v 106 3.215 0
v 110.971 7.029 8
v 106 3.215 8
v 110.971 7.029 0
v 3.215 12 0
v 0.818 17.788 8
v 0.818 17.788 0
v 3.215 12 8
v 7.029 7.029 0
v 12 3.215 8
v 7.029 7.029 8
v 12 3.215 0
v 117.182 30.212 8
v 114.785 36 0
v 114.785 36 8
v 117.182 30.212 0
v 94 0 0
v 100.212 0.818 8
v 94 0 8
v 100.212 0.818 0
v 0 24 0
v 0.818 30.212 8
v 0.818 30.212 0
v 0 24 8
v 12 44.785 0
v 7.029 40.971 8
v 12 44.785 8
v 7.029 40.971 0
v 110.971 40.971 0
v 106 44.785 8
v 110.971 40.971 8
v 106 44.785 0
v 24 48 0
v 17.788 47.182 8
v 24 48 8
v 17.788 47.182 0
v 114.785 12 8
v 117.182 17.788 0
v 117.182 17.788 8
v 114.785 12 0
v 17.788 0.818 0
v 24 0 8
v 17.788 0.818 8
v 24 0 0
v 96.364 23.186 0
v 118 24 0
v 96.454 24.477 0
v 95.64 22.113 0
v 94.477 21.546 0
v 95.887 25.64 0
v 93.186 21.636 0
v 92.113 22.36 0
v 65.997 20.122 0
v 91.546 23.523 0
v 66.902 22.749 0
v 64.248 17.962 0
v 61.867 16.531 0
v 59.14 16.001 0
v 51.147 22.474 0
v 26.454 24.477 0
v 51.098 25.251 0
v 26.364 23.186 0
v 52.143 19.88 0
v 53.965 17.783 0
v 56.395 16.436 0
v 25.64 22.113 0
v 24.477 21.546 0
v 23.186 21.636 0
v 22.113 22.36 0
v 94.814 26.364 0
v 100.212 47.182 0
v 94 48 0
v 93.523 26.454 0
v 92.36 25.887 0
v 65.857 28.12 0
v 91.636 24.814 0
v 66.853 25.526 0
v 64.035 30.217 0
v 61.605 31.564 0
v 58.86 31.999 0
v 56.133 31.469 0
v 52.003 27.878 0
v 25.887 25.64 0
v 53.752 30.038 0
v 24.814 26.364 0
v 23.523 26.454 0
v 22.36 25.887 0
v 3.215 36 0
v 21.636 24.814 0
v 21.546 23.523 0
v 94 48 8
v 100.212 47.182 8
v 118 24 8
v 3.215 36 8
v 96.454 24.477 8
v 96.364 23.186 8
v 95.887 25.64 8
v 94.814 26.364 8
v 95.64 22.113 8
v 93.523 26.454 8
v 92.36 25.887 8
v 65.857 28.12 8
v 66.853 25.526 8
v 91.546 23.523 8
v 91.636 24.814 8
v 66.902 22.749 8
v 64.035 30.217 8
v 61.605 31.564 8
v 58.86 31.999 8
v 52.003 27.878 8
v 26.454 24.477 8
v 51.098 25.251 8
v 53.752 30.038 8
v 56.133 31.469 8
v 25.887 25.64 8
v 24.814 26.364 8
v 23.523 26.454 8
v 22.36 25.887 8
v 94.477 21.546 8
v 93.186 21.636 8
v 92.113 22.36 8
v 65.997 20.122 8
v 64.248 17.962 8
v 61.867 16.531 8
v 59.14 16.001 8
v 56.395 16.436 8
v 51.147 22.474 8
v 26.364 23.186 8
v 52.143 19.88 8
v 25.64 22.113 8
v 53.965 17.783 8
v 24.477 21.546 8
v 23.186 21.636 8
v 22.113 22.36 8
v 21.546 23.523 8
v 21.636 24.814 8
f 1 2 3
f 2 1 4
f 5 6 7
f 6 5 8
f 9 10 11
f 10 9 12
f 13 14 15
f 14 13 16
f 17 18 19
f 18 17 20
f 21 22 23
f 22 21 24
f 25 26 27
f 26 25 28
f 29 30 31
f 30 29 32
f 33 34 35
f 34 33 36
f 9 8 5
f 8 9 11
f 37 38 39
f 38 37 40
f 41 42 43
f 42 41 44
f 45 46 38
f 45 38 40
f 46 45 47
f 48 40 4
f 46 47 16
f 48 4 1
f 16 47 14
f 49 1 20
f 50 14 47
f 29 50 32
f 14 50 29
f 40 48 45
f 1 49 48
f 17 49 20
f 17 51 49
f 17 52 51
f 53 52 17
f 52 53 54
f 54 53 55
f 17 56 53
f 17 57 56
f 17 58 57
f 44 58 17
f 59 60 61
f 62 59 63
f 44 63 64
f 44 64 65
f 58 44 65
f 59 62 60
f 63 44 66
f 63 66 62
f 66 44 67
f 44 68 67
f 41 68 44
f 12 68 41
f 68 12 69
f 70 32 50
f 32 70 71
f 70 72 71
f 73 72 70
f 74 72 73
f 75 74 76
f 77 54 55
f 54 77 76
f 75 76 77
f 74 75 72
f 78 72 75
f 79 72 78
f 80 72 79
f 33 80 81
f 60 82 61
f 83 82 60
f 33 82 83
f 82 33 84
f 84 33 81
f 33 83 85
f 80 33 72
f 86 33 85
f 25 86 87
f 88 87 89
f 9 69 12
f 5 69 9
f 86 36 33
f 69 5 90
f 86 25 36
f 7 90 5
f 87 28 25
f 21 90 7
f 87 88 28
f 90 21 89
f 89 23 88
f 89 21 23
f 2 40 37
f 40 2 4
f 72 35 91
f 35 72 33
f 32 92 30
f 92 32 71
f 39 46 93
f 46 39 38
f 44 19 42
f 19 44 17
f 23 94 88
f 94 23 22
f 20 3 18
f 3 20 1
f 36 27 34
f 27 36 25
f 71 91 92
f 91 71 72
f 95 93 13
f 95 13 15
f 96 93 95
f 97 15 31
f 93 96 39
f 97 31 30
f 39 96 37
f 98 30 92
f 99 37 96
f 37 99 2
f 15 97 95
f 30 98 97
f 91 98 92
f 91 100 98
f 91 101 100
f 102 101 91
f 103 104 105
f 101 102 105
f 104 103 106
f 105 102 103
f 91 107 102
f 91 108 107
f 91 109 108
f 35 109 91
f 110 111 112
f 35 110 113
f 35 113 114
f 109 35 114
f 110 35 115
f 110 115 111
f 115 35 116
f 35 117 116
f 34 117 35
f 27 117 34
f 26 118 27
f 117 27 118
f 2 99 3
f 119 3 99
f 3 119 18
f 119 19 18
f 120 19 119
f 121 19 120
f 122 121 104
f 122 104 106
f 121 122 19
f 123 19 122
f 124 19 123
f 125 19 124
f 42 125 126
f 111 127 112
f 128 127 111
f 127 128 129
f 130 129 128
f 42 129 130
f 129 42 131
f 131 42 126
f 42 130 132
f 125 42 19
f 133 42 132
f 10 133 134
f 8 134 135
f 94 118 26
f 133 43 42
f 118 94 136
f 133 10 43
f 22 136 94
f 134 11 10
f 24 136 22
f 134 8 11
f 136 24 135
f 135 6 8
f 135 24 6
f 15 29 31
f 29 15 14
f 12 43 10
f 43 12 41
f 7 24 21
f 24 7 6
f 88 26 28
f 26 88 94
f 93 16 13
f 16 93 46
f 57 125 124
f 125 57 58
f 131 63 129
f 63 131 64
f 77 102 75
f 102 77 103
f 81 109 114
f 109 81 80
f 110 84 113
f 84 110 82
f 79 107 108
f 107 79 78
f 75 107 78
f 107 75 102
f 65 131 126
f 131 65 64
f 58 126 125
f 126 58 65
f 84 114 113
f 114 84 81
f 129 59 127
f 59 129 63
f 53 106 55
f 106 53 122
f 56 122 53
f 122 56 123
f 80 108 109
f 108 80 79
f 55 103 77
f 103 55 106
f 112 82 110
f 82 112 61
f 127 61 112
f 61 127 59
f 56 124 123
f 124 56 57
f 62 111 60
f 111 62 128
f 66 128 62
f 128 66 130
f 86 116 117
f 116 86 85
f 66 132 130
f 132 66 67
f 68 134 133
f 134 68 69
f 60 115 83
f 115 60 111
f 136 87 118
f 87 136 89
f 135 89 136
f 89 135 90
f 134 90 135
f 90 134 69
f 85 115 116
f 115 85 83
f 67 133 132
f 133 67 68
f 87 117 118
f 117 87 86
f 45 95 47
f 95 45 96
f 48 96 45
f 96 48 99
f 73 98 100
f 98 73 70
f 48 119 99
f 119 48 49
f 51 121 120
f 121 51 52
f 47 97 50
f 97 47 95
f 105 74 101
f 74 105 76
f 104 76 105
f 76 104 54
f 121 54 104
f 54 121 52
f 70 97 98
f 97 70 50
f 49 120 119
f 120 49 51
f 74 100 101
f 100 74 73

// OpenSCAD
$fn = 32;

// ----------------------------------------------------------------------
// Spacer plate: obround span 70, caps R24
// ----------------------------------------------------------------------

// --- parameters (mm) ---
bore_r = 8;               // centre bore radius
bolt_r = 2.5;             // bolt hole radius
plate_t = 8;              // plate thickness, Z (extrusion height)
span = 70;                // obround span
cap_r = 24;               // cap radius

profile = [[24, 48], [17.788, 47.182], [12, 44.785], [7.029, 40.971], [3.215, 36], [0.818, 30.212], [0, 24], [0.818, 17.788], [3.215, 12], [7.029, 7.029], [12, 3.215], [17.788, 0.818], [24, 0], [94, 0], [100.212, 0.818], [106, 3.215], [110.971, 7.029], [114.785, 12], [117.182, 17.788], [118, 24], [117.182, 30.212], [114.785, 36], [110.971, 40.971], [106, 44.785], [100.212, 47.182], [94, 48]];  // primary outline, 26 points, counter clockwise
void_1 = [[66.853, 25.526], [65.857, 28.12], [64.035, 30.217], [61.605, 31.564], [58.86, 31.999], [56.133, 31.469], [53.752, 30.038], [52.003, 27.878], [51.098, 25.251], [51.147, 22.474], [52.143, 19.88], [53.965, 17.783], [56.395, 16.436], [59.14, 16.001], [61.867, 16.531], [64.248, 17.962], [65.997, 20.122], [66.902, 22.749]];  // centre bore, 18 points
void_2 = [[26.454, 24.477], [25.887, 25.64], [24.814, 26.364], [23.523, 26.454], [22.36, 25.887], [21.636, 24.814], [21.546, 23.523], [22.113, 22.36], [23.186, 21.636], [24.477, 21.546], [25.64, 22.113], [26.364, 23.186]];  // end hole, 12 points
void_3 = [[96.454, 24.477], [95.887, 25.64], [94.814, 26.364], [93.523, 26.454], [92.36, 25.887], [91.636, 24.814], [91.546, 23.523], [92.113, 22.36], [93.186, 21.636], [94.477, 21.546], [95.64, 22.113], [96.364, 23.186]];  // end hole, 12 points

// --- the one profile operation ---
difference() {
  linear_extrude(height = plate_t) polygon(points = profile);
  translate([0, 0, -1])
    linear_extrude(height = plate_t + 2) polygon(points = void_1);
  translate([0, 0, -1])
    linear_extrude(height = plate_t + 2) polygon(points = void_2);
  translate([0, 0, -1])
    linear_extrude(height = plate_t + 2) polygon(points = void_3);
}
